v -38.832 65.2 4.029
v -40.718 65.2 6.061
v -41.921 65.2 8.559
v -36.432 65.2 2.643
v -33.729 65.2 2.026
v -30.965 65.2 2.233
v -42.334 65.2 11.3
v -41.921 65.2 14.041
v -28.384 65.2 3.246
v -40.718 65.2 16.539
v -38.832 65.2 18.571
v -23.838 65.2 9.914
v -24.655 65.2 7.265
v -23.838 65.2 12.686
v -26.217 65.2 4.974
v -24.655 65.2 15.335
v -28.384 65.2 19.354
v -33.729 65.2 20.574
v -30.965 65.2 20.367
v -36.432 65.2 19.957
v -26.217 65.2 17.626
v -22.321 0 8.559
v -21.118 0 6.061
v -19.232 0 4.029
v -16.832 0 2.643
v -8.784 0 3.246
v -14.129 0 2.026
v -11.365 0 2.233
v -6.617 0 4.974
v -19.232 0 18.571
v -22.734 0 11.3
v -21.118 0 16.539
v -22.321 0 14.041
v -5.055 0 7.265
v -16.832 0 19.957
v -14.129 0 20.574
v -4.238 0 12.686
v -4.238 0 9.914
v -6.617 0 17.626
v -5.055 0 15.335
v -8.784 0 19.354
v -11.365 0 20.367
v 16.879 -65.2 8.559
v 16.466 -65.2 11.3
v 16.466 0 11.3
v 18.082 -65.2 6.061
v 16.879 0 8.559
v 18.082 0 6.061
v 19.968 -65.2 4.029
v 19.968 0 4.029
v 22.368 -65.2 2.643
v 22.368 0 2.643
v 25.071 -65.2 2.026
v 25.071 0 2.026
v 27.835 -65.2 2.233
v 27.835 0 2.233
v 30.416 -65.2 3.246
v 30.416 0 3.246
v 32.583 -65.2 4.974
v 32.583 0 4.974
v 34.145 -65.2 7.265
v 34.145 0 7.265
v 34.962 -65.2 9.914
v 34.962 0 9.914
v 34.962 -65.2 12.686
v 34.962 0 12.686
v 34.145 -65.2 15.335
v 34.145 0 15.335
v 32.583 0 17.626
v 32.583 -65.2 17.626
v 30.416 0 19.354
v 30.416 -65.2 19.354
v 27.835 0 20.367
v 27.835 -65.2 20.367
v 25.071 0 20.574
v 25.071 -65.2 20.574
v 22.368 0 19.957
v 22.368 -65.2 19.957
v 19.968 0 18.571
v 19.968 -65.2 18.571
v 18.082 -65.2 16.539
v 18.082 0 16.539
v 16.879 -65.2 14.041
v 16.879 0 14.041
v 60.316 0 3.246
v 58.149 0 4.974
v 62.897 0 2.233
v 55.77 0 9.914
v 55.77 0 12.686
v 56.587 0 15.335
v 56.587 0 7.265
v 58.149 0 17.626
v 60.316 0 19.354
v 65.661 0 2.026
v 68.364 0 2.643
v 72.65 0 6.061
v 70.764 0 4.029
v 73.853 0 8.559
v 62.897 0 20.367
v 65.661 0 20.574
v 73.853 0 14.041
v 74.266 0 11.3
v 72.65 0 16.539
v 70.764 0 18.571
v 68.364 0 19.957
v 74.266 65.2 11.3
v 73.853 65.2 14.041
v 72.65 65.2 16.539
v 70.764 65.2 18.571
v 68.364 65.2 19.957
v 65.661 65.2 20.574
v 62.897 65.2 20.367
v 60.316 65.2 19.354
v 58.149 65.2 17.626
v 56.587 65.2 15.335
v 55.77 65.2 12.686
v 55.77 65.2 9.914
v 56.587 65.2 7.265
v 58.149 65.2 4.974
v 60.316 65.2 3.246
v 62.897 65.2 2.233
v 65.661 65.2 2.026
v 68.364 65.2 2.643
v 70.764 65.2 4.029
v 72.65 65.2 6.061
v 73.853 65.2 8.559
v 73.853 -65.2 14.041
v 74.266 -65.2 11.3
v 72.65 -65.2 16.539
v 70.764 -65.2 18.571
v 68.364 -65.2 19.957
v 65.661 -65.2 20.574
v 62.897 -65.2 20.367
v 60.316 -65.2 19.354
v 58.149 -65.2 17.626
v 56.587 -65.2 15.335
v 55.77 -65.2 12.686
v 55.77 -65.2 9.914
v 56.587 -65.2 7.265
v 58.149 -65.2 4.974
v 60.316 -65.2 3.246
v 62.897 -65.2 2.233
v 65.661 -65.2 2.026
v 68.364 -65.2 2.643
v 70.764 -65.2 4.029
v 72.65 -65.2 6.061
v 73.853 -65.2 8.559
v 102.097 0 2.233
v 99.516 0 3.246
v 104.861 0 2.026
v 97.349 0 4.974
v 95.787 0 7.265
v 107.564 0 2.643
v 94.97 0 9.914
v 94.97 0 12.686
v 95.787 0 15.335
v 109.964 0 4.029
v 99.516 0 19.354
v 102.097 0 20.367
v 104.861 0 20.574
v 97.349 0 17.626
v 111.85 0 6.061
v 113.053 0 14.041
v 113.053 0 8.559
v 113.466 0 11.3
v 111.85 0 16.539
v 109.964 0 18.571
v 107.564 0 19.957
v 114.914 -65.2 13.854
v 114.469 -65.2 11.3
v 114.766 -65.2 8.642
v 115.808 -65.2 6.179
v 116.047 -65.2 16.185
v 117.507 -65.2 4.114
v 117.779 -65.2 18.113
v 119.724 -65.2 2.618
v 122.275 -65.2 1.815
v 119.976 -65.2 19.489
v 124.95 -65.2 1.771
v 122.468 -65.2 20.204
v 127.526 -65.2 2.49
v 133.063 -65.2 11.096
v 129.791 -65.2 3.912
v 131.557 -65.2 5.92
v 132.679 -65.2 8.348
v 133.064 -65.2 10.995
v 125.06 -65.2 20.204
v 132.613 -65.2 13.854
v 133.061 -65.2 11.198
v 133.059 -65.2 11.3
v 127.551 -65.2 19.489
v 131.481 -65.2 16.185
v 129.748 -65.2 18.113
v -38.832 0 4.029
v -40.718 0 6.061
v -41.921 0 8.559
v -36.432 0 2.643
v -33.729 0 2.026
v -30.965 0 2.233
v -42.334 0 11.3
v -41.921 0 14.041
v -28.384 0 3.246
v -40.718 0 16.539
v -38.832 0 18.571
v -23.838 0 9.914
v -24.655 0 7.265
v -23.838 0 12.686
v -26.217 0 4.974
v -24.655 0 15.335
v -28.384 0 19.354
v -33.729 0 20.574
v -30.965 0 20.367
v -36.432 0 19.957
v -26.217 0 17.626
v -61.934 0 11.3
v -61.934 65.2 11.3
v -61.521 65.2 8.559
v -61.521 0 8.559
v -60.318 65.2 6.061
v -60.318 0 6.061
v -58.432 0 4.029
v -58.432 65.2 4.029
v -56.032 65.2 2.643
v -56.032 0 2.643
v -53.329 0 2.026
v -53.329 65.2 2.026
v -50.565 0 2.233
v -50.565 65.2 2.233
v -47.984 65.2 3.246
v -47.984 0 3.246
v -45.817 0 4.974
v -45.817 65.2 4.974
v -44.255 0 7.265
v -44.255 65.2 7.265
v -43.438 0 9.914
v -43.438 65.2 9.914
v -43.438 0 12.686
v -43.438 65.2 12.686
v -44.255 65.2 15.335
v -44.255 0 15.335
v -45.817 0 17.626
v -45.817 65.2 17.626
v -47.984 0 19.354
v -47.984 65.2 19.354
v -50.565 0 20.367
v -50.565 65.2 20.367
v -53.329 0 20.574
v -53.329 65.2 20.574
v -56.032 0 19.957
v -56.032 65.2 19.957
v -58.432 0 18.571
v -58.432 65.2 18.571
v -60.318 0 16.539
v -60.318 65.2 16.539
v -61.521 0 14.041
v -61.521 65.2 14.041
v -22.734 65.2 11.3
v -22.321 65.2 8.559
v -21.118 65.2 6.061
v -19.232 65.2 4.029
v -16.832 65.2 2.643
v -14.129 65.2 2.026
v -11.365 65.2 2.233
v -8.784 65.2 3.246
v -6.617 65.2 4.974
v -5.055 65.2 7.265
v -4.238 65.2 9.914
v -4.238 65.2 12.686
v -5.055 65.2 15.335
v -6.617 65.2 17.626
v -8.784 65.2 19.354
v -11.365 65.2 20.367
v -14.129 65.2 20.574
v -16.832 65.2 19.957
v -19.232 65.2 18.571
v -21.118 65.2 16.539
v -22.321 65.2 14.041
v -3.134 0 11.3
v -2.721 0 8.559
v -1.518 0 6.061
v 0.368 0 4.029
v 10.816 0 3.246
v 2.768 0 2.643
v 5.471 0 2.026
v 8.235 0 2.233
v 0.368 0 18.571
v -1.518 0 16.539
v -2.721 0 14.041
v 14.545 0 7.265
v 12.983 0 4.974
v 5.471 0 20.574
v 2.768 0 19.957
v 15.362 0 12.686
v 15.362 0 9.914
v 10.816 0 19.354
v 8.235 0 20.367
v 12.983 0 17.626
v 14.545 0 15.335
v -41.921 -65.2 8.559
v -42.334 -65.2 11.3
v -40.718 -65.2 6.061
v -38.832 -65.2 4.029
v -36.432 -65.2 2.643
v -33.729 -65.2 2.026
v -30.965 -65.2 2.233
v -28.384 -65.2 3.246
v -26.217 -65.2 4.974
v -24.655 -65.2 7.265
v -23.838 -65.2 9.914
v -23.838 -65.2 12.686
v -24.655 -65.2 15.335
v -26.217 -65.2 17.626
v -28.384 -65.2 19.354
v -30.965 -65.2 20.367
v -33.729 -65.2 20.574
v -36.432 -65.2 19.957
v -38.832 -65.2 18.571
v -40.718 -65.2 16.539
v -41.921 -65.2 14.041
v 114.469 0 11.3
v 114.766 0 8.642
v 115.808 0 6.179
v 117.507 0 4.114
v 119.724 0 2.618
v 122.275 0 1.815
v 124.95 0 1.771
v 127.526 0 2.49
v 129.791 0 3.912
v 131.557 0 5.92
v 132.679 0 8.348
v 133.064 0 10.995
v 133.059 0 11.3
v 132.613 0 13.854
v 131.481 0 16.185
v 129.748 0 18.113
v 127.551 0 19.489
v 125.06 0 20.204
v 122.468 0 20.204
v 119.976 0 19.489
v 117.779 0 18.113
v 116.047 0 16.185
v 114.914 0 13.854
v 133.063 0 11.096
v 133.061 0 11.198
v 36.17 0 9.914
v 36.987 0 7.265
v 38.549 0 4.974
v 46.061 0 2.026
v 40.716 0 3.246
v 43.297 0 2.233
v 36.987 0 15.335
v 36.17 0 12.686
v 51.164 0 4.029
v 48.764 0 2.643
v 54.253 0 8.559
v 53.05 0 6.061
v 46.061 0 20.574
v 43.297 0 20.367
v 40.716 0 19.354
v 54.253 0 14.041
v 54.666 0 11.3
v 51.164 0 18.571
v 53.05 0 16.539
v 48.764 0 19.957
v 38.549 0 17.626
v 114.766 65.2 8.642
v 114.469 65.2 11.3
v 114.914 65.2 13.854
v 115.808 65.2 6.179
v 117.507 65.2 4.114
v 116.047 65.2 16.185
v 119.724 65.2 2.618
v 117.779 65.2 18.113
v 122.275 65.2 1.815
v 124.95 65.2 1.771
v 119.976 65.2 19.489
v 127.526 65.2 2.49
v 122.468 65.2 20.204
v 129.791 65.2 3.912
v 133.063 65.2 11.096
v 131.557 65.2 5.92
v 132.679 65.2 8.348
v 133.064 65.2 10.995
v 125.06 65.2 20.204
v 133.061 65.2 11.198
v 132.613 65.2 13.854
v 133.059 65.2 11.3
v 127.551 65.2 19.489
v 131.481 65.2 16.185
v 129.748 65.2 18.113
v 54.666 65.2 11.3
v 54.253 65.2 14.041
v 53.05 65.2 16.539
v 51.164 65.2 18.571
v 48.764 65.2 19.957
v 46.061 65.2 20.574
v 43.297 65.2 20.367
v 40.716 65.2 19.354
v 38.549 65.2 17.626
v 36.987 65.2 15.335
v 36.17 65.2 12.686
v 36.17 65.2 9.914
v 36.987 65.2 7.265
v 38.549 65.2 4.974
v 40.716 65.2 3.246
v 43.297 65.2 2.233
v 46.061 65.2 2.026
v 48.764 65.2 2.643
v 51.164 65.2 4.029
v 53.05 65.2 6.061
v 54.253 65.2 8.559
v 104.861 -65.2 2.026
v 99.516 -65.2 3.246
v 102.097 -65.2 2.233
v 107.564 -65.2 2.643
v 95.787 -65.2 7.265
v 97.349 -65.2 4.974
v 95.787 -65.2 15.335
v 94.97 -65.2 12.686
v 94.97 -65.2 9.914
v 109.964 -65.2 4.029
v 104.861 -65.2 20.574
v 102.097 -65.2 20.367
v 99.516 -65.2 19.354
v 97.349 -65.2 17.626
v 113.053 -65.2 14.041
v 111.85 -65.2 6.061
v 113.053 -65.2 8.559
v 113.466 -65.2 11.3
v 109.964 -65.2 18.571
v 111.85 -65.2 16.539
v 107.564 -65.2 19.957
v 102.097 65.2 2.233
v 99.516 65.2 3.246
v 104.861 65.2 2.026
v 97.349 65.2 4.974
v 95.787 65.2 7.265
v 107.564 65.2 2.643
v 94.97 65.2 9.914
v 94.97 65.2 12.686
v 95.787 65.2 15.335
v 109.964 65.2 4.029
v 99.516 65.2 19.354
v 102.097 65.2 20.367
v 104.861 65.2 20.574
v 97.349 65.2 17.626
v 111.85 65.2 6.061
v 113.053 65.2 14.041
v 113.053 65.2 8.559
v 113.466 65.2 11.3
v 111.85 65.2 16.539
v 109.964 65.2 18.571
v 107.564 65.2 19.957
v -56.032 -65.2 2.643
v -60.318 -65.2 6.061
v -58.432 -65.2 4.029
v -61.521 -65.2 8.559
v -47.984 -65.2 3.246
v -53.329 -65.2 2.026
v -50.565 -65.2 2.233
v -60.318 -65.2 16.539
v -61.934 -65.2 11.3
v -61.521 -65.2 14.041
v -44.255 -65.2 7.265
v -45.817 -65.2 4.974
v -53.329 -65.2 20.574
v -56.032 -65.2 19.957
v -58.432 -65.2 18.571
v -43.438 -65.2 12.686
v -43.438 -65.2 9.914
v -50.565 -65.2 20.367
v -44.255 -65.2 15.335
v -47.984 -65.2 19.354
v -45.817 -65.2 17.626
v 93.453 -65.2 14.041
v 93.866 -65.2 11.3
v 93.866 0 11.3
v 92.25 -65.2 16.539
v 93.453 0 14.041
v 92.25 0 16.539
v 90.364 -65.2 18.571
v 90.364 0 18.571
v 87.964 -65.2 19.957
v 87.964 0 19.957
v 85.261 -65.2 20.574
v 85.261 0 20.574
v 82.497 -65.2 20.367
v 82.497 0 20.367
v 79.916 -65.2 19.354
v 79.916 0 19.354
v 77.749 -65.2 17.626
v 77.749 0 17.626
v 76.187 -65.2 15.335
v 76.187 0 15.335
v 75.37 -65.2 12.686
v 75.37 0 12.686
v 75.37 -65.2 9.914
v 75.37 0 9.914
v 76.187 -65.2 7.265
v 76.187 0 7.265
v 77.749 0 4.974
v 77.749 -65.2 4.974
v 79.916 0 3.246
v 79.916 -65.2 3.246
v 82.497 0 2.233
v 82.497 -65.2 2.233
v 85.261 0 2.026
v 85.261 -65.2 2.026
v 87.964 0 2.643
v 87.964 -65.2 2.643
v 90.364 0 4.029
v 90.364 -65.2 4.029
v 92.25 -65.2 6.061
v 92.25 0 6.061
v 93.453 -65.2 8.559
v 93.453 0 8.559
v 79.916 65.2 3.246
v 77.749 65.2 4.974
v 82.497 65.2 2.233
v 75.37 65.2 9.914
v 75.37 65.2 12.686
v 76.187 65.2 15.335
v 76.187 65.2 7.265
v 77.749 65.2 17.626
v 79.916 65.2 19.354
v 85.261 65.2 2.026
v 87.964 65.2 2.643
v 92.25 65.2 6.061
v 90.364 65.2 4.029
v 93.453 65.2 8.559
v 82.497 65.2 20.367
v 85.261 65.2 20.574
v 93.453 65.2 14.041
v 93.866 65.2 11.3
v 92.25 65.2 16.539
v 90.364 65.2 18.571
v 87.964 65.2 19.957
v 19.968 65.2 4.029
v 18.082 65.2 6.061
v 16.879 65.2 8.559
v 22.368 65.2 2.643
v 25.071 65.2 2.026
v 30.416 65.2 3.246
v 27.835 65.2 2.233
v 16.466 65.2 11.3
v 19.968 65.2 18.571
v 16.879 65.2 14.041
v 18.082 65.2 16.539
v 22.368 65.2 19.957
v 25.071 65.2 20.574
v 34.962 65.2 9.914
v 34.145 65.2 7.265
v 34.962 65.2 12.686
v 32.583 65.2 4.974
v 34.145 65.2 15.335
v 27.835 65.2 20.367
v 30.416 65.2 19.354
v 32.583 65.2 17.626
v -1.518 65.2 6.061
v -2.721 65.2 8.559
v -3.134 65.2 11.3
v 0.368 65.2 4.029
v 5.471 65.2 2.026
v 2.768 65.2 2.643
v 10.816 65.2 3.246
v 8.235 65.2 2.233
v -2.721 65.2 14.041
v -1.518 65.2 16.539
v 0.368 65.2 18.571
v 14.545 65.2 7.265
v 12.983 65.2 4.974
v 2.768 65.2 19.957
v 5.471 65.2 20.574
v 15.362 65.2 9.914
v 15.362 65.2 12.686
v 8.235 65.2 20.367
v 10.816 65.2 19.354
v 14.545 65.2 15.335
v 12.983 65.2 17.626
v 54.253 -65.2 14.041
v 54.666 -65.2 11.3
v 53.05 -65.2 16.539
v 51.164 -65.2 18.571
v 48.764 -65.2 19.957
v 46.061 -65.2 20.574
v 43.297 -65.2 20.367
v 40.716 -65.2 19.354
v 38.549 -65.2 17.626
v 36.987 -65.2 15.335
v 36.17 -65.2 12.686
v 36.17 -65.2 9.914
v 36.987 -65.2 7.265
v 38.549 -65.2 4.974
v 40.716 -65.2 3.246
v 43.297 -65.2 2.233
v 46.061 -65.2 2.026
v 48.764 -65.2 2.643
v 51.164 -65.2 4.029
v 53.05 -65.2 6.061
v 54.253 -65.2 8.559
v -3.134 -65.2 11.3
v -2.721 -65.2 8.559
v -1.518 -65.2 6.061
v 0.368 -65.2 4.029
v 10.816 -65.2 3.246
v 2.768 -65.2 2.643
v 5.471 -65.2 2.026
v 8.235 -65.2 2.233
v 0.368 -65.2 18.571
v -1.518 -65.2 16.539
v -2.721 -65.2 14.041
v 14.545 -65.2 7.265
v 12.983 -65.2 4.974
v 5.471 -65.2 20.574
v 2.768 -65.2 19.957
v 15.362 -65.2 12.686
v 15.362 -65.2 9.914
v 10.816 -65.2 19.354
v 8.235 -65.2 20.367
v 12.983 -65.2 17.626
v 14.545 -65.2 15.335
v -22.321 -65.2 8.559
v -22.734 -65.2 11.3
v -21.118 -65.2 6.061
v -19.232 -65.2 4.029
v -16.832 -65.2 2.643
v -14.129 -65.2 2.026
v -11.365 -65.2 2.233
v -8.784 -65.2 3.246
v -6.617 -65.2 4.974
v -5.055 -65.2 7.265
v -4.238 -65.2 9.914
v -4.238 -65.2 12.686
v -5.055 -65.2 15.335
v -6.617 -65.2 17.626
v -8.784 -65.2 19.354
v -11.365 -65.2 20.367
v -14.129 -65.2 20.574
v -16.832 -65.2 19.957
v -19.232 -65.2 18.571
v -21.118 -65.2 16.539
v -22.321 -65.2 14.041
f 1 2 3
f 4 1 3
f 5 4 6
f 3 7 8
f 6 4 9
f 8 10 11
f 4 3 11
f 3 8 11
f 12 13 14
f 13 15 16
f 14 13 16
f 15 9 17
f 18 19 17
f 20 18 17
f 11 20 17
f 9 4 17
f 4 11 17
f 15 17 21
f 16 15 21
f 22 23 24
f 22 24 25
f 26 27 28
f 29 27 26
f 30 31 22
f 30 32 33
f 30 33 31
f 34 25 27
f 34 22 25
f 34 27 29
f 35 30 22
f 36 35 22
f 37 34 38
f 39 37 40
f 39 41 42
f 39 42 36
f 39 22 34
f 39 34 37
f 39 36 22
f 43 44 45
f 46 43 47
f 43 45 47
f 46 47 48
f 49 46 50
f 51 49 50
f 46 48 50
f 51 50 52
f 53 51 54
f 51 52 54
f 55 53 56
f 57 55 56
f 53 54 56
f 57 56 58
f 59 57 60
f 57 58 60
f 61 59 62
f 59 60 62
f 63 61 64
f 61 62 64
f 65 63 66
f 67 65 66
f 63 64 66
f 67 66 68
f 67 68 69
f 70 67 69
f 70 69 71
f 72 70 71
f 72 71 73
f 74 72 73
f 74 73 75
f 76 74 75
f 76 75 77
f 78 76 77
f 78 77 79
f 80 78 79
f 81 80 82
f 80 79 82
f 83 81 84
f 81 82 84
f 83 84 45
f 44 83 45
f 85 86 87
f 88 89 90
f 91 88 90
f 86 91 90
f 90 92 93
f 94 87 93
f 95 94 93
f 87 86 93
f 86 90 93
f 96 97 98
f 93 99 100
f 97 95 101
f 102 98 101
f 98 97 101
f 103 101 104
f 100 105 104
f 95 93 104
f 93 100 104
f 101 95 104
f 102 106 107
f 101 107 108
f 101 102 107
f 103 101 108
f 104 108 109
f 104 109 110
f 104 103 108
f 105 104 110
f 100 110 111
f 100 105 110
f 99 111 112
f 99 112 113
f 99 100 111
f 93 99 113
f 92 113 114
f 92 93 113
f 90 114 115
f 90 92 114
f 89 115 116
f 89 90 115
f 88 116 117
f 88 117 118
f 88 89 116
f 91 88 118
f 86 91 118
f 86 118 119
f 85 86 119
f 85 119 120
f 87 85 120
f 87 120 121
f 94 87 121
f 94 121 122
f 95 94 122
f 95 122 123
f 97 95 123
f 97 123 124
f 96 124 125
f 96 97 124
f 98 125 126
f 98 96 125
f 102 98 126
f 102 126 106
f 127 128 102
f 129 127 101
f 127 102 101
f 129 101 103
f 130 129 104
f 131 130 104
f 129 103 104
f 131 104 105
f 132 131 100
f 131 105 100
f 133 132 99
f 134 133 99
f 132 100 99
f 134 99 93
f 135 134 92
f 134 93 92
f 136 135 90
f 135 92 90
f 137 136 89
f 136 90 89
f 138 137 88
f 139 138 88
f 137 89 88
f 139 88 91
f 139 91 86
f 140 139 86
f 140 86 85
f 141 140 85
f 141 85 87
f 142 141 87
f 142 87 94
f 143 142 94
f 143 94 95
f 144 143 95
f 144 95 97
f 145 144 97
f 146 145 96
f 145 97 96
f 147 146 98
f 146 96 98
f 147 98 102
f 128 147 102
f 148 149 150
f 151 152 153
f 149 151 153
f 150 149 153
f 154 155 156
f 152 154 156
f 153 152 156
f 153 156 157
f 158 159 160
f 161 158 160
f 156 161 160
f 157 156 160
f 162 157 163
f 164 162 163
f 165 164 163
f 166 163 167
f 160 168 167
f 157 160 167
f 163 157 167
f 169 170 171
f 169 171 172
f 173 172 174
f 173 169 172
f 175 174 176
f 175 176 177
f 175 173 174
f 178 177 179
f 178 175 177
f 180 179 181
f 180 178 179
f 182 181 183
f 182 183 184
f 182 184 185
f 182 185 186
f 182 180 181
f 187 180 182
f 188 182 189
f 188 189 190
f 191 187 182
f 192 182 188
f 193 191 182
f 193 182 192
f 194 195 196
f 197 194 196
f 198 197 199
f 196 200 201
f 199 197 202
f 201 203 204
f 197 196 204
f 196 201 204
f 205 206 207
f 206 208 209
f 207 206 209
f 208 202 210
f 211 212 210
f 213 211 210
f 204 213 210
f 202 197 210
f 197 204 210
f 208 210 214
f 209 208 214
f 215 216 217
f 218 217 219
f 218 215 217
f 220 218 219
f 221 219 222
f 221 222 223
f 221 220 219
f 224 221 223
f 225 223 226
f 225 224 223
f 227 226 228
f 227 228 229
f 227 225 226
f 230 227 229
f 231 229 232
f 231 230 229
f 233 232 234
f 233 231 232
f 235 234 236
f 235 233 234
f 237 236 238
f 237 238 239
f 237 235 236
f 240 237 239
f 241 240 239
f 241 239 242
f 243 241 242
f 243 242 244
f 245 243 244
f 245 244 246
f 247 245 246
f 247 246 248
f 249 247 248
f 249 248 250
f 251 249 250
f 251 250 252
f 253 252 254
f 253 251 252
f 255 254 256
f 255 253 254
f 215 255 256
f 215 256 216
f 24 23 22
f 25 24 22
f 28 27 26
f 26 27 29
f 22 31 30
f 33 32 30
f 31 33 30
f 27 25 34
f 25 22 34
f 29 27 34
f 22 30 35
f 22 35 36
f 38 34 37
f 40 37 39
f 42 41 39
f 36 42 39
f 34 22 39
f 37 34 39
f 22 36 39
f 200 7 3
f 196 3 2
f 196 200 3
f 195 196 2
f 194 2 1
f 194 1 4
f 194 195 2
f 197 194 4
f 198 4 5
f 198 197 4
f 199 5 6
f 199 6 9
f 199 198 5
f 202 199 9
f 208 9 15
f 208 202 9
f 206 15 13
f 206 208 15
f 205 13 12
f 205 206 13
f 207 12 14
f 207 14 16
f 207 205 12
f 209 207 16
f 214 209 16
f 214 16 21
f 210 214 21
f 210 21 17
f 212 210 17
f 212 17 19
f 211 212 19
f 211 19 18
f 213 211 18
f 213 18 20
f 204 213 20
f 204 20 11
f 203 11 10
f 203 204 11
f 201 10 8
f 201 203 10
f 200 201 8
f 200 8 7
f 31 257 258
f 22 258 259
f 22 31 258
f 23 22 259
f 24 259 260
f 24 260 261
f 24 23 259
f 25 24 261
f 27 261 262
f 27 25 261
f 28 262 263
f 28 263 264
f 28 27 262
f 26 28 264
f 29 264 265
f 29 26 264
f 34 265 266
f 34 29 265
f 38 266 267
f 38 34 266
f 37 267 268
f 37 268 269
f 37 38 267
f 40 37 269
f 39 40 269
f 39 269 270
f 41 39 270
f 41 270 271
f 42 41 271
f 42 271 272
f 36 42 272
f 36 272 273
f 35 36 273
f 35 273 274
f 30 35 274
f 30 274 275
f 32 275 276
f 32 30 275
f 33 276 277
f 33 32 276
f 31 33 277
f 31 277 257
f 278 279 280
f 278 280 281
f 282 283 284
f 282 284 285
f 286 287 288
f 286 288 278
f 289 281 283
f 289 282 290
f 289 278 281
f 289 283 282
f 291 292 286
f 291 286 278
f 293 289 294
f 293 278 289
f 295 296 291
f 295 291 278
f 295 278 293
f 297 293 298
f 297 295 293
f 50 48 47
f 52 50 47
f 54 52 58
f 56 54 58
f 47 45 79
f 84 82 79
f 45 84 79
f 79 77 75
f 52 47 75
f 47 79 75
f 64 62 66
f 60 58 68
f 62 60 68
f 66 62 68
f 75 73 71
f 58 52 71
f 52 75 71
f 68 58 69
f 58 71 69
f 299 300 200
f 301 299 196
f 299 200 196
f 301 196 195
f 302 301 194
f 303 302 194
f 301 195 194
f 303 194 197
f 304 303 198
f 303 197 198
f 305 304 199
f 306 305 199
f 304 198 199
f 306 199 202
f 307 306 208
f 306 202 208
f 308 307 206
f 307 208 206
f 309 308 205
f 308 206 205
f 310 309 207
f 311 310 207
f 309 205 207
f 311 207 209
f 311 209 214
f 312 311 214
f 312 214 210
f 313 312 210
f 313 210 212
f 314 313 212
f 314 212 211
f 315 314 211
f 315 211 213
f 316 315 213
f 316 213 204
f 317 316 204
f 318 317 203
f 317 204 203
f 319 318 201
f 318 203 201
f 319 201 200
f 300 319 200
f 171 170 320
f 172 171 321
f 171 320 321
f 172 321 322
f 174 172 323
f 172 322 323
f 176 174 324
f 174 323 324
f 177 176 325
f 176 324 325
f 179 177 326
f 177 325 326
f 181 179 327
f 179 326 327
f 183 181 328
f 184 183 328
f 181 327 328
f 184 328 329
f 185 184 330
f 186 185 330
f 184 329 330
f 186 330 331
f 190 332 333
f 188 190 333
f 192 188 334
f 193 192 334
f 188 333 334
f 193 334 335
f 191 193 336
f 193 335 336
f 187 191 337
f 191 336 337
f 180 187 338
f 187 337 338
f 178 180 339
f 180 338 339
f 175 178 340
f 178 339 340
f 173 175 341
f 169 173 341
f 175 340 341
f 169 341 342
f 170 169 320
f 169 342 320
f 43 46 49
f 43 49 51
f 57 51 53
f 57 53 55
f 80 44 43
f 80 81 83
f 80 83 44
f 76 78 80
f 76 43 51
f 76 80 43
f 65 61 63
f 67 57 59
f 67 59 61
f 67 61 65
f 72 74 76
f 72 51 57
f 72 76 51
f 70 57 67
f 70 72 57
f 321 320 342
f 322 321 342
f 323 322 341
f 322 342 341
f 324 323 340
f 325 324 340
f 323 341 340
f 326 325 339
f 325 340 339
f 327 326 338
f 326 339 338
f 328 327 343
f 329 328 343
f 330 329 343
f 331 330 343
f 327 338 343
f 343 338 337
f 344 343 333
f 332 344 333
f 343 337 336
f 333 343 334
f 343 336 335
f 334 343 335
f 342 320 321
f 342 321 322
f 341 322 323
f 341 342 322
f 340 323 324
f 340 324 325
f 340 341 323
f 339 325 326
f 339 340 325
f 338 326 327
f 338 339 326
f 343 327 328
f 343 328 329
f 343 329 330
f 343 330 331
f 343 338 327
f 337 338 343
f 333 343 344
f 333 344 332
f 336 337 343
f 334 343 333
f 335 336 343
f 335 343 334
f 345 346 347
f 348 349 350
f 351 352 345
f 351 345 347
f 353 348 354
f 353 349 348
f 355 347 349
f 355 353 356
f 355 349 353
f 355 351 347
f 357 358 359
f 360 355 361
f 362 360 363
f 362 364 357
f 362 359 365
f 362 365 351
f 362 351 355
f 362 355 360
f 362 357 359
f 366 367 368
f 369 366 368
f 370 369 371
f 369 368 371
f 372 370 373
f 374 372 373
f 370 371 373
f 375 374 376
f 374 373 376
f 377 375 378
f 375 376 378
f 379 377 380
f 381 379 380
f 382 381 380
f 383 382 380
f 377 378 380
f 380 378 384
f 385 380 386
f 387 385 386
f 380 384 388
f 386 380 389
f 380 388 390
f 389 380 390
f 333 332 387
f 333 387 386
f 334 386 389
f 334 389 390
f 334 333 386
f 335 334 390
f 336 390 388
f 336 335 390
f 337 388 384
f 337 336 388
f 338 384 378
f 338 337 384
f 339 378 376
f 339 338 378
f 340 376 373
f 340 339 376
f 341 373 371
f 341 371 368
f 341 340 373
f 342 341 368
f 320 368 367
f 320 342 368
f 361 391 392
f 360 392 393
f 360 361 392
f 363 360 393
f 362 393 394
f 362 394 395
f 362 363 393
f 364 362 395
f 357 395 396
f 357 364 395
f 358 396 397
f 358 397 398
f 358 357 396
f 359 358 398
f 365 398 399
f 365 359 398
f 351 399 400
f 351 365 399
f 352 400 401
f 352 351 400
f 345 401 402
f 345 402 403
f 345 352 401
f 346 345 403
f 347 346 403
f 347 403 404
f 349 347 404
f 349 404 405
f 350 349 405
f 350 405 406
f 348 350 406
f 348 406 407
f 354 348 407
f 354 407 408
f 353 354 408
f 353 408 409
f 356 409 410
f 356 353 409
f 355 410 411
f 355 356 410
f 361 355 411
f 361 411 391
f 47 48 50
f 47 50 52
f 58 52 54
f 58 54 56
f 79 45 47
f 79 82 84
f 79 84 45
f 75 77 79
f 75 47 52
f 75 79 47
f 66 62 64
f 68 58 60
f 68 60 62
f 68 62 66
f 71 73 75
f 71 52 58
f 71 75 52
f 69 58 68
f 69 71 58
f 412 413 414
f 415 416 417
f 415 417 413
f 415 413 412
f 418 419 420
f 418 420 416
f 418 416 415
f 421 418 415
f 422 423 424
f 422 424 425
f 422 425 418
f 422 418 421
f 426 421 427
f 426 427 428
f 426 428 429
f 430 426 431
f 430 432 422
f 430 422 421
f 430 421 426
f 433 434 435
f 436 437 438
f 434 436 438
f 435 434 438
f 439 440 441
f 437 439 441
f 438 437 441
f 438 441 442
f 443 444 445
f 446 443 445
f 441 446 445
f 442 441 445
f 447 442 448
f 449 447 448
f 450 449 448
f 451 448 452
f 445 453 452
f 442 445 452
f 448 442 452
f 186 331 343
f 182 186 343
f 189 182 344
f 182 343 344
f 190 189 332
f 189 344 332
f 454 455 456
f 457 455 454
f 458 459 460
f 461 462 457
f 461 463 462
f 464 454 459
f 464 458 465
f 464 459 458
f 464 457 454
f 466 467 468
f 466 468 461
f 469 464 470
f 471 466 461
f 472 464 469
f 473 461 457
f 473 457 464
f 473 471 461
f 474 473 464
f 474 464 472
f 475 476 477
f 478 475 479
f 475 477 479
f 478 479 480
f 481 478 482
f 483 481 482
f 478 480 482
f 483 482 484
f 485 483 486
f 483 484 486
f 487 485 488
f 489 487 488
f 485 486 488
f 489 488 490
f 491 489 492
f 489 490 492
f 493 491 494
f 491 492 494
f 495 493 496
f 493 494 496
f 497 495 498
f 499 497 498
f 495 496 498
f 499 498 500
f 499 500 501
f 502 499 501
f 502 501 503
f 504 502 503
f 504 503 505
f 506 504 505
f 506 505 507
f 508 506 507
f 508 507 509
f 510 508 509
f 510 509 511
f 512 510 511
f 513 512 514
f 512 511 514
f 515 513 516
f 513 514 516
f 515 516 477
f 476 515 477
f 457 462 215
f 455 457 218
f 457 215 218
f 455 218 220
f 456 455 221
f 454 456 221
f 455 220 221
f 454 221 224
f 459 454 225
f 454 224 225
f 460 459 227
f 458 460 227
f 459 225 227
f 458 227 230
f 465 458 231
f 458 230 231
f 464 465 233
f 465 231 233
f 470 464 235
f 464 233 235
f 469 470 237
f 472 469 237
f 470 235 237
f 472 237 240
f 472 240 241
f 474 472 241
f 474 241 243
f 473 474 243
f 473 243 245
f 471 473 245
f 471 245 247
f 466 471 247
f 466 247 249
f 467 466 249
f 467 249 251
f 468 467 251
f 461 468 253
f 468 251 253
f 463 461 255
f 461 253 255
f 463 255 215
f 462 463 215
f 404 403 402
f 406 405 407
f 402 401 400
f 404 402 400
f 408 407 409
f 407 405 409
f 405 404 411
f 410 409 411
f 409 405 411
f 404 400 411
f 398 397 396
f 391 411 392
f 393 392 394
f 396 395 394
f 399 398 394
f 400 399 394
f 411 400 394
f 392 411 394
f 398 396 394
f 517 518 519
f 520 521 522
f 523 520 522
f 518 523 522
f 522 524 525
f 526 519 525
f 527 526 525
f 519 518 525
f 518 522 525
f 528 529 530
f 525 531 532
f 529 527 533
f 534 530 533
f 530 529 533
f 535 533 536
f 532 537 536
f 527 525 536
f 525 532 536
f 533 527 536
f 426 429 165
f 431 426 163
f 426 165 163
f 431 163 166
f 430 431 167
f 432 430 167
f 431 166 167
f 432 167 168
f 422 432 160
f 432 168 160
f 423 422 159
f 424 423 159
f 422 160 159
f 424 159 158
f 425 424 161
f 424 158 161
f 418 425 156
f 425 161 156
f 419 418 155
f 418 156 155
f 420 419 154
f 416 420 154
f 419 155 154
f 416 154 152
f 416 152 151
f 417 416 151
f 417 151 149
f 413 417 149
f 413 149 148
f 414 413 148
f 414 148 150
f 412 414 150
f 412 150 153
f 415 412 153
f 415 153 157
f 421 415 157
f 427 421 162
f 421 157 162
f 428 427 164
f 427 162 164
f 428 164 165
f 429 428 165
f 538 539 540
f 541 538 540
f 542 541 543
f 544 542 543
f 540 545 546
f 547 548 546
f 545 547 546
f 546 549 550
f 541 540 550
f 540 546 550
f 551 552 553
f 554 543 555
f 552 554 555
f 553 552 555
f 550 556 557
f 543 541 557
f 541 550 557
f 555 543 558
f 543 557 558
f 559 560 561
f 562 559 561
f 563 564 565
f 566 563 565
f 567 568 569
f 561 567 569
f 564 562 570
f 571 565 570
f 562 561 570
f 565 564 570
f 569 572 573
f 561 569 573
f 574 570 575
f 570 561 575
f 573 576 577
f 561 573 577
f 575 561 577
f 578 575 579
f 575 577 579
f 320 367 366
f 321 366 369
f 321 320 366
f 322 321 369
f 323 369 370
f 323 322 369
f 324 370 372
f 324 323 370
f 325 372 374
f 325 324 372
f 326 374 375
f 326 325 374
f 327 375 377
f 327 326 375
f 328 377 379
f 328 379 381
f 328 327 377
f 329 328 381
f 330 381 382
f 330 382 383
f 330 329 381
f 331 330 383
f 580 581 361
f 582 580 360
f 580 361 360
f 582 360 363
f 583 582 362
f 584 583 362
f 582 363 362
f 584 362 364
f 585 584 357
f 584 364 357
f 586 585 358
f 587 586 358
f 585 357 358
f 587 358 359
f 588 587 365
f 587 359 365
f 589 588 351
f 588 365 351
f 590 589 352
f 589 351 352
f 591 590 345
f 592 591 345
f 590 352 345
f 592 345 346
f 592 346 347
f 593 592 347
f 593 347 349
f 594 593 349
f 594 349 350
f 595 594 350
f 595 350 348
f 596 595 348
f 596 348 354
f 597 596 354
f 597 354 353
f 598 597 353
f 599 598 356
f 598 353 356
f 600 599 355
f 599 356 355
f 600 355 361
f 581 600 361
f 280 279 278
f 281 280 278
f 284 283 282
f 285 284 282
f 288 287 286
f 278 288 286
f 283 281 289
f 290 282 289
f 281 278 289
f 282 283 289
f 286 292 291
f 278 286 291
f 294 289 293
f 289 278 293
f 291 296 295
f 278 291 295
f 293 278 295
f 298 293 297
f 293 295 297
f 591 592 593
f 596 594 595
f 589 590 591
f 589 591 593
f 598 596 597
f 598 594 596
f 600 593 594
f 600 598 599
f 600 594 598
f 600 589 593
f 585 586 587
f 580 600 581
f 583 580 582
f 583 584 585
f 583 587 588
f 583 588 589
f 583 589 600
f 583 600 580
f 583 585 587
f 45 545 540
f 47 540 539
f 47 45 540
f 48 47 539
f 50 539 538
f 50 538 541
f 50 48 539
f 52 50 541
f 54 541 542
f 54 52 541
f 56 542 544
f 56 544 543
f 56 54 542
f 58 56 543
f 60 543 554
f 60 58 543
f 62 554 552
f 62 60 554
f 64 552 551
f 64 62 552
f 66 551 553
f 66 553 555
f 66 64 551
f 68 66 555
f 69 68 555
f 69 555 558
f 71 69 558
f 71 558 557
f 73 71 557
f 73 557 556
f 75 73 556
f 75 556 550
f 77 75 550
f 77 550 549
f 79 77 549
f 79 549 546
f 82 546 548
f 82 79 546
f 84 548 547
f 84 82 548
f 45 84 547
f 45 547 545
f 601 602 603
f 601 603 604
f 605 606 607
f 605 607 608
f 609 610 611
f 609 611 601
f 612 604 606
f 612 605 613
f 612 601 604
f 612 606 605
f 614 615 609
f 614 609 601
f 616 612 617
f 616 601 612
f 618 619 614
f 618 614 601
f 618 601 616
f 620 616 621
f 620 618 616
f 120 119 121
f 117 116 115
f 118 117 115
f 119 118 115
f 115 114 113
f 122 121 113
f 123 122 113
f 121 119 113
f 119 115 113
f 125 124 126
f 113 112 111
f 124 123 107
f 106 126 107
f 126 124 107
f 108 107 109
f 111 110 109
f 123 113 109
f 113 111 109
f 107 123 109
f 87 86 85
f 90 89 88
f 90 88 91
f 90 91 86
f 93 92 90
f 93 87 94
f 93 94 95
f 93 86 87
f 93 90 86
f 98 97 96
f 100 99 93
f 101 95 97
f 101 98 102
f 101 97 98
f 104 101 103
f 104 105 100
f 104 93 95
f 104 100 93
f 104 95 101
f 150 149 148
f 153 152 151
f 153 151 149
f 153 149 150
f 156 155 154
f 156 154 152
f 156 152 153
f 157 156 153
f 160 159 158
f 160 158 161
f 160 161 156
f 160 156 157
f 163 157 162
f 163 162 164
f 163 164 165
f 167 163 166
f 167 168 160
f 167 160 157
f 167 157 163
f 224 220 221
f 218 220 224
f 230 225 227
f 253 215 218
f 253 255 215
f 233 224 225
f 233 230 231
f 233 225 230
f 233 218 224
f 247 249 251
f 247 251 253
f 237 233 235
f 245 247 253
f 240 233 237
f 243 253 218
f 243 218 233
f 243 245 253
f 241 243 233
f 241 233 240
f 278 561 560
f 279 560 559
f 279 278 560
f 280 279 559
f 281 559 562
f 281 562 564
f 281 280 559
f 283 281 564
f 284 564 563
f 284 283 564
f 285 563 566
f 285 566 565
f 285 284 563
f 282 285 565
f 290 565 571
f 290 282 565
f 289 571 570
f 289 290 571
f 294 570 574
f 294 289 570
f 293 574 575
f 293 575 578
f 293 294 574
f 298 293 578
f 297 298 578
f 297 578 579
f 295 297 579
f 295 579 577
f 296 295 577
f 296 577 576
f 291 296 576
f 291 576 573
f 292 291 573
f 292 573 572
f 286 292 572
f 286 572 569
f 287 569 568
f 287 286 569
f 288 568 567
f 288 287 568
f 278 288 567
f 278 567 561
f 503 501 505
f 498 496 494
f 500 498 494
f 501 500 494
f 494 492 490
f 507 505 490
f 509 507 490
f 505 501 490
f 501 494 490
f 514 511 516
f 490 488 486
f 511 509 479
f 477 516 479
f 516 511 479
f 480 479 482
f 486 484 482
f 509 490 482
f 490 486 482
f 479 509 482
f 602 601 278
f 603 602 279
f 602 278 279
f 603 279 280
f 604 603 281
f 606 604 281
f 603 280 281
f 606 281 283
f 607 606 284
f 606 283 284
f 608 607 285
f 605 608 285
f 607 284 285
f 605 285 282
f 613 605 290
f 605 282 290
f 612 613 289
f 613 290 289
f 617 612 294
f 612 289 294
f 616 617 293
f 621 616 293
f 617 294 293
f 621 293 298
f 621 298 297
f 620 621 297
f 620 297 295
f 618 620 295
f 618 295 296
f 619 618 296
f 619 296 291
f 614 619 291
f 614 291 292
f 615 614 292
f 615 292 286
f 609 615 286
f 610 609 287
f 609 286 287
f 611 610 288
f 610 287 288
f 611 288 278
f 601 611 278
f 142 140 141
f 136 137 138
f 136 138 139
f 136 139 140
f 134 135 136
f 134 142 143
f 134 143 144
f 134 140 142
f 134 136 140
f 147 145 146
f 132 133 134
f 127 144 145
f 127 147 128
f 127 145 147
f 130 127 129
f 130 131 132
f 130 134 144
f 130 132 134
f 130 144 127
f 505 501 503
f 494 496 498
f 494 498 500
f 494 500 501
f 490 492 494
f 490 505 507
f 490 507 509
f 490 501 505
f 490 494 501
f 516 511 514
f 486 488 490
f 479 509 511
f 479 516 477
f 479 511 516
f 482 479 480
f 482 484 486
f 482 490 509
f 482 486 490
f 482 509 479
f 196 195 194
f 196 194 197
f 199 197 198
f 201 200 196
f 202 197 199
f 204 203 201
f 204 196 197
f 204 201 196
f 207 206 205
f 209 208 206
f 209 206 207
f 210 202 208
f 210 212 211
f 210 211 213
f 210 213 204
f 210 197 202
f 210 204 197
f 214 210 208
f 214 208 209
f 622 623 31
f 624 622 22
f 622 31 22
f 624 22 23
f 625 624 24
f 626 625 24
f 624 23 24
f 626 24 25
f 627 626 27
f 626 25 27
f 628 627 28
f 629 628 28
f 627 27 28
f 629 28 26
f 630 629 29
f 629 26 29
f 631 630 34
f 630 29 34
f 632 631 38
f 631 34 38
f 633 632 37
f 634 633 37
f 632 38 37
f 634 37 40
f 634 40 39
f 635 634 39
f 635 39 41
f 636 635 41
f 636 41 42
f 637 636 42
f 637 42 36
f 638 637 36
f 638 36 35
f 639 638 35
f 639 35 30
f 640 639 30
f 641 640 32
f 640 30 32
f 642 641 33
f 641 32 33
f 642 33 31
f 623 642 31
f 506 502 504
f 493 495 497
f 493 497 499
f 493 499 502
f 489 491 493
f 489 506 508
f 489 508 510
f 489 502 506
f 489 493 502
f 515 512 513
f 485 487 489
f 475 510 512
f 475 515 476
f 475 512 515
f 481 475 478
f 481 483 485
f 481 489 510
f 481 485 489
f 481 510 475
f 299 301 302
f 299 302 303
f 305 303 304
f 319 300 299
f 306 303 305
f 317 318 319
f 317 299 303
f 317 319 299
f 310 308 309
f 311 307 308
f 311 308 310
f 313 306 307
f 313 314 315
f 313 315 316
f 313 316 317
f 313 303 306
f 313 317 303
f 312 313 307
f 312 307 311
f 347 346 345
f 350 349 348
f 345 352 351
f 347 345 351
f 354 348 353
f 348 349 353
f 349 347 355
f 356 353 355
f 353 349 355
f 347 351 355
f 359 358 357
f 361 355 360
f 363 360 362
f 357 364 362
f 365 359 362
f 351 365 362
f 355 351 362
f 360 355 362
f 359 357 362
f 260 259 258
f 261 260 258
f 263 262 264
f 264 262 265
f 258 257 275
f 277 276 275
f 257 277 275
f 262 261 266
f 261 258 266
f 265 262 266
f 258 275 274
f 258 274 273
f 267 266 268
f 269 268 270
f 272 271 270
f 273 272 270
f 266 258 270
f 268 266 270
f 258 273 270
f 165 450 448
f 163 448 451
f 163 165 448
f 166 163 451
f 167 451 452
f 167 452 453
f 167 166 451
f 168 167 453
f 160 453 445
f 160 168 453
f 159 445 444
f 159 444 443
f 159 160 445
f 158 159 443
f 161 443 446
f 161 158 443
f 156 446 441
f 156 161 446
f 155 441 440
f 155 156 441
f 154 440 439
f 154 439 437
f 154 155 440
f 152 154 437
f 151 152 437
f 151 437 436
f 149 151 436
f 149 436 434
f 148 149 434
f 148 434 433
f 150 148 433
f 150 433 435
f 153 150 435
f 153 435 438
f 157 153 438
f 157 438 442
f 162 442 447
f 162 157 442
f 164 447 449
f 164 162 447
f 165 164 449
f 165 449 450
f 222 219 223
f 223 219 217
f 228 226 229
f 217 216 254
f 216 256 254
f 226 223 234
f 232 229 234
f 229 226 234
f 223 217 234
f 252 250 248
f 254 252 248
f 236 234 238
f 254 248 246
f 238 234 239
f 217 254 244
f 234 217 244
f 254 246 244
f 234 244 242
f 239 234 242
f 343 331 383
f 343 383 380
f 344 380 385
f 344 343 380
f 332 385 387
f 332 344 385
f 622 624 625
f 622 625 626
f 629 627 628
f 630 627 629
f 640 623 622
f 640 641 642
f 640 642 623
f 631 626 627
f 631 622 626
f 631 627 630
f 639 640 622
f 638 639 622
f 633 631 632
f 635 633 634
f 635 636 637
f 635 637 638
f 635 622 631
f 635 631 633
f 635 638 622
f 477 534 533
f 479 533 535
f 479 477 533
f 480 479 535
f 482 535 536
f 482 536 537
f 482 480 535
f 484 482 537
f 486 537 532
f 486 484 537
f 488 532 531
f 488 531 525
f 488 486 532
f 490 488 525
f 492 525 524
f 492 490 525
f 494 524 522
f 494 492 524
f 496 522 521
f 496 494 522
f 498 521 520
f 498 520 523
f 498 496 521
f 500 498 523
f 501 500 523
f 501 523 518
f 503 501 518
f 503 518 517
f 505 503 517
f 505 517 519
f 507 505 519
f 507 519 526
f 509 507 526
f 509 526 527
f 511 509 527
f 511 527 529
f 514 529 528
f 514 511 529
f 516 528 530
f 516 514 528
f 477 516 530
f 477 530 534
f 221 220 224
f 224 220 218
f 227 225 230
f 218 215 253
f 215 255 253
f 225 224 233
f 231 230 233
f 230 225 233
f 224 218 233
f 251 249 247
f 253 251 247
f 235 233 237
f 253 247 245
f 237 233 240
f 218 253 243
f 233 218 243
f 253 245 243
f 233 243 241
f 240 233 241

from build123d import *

# Parameters (mm, degrees)
F1_DEPTH = 65.2


with BuildPart() as f1:
    # F0 (on Front) → F1 (new body)
    with BuildSketch(Plane.XZ):
        with BuildLine():
            Line((-61.9339610934, 11.3), (-43.3339610934, 11.3))
            ThreePointArc((-43.3339610934, 11.3), (-52.6339610934, 20.6), (-61.9339610934, 11.3))
        make_face()
        with BuildLine():
            ThreePointArc((-61.9339610934, 11.3), (-52.6339610934, 2), (-43.3339610934, 11.3))
            Line((-43.3339610934, 11.3), (-61.9339610934, 11.3))
        make_face()
    extrude(amount=F1_DEPTH)


with BuildPart() as f1b:
    # F0 (on Front) → F1, piece 2 (new body)
    with BuildSketch(Plane.XZ):
        with BuildLine():
            ThreePointArc((-23.7339610934, 11.3), (-33.0339610934, 20.6), (-42.3339610934, 11.3))
            Line((-42.3339610934, 11.3), (-23.7339610934, 11.3))
        make_face()
        with BuildLine():
            Line((-23.7339610934, 11.3), (-42.3339610934, 11.3))
            ThreePointArc((-42.3339610934, 11.3), (-33.0339610934, 2), (-23.7339610934, 11.3))
        make_face()
    extrude(amount=F1_DEPTH)


with BuildPart() as f1c:
    # F0 (on Front) → F1, piece 3 (new body)
    with BuildSketch(Plane.XZ):
        with BuildLine():
            ThreePointArc((-4.1339610934, 11.3), (-13.4339610934, 20.6), (-22.7339610934, 11.3))
            Line((-22.7339610934, 11.3), (-4.1339610934, 11.3))
        make_face()
        with BuildLine():
            Line((-4.1339610934, 11.3), (-22.7339610934, 11.3))
            ThreePointArc((-22.7339610934, 11.3), (-13.4339610934, 2), (-4.1339610934, 11.3))
        make_face()
    extrude(amount=F1_DEPTH)


with BuildPart() as f1d:
    # F0 (on Front) → F1, piece 4 (new body)
    with BuildSketch(Plane.XZ):
        with BuildLine():
            ThreePointArc((15.4660389066, 11.3), (6.1660389066, 20.6), (-3.1339610934, 11.3))
            Line((-3.1339610934, 11.3), (15.4660389066, 11.3))
        make_face()
        with BuildLine():
            Line((15.4660389066, 11.3), (-3.1339610934, 11.3))
            ThreePointArc((-3.1339610934, 11.3), (6.1660389066, 2), (15.4660389066, 11.3))
        make_face()
    extrude(amount=F1_DEPTH)


with BuildPart() as f1e:
    # F0 (on Front) → F1, piece 5 (new body)
    with BuildSketch(Plane.XZ):
        with BuildLine():
            ThreePointArc((35.0660389066, 11.3), (25.7660389066, 20.6), (16.4660389066, 11.3))
            Line((16.4660389066, 11.3), (35.0660389066, 11.3))
        make_face()
        with BuildLine():
            Line((35.0660389066, 11.3), (16.4660389066, 11.3))
            ThreePointArc((16.4660389066, 11.3), (25.7660389066, 2), (35.0660389066, 11.3))
        make_face()
    extrude(amount=F1_DEPTH)


with BuildPart() as f1f:
    # F0 (on Front) → F1, piece 6 (new body)
    with BuildSketch(Plane.XZ):
        with BuildLine():
            Line((54.6660389066, 11.3), (36.0660389066, 11.3))
            ThreePointArc((36.0660389066, 11.3), (45.3660389066, 2), (54.6660389066, 11.3))
        make_face()
        with BuildLine():
            ThreePointArc((54.6660389066, 11.3), (45.3660389066, 20.6), (36.0660389066, 11.3))
            Line((36.0660389066, 11.3), (54.6660389066, 11.3))
        make_face()
    extrude(amount=F1_DEPTH)


with BuildPart() as f1g:
    # F0 (on Front) → F1, piece 7 (new body)
    with BuildSketch(Plane.XZ):
        with BuildLine():
            Line((74.2660389066, 11.3), (55.6660389066, 11.3))
            ThreePointArc((55.6660389066, 11.3), (64.9660389066, 2), (74.2660389066, 11.3))
        make_face()
        with BuildLine():
            ThreePointArc((74.2660389066, 11.3), (64.9660389066, 20.6), (55.6660389066, 11.3))
            Line((55.6660389066, 11.3), (74.2660389066, 11.3))
        make_face()
    extrude(amount=F1_DEPTH)


with BuildPart() as f1h:
    # F0 (on Front) → F1, piece 8 (new body)
    with BuildSketch(Plane.XZ):
        with BuildLine():
            ThreePointArc((75.2660389066, 11.3), (84.5660389066, 2), (93.8660389066, 11.3))
            Line((93.8660389066, 11.3), (75.2660389066, 11.3))
        make_face()
        with BuildLine():
            Line((75.2660389066, 11.3), (93.8660389066, 11.3))
            ThreePointArc((93.8660389066, 11.3), (84.5660389066, 20.6), (75.2660389066, 11.3))
        make_face()
    extrude(amount=F1_DEPTH)


with BuildPart() as f1i:
    # F0 (on Front) → F1, piece 9 (new body)
    with BuildSketch(Plane.XZ):
        with BuildLine():
            ThreePointArc((94.8660389066, 11.3), (104.1660389066, 2), (113.4660389066, 11.3))
            Line((113.4660389066, 11.3), (94.8660389066, 11.3))
        make_face()
        with BuildLine():
            Line((94.8660389066, 11.3), (113.4660389066, 11.3))
            ThreePointArc((113.4660389066, 11.3), (104.1660389066, 20.6), (94.8660389066, 11.3))
        make_face()
    extrude(amount=F1_DEPTH)


with BuildPart() as f1j:
    # F0 (on Front) → F1, piece 10 (new body)
    with BuildSketch(Plane.XZ):
        with BuildLine():
            ThreePointArc((133.0636610872, 10.9947052806), (133.0624079115, 11.1473732123), (133.0586487222, 11.3))
            Line((133.0586487222, 11.3), (114.4686734522, 11.3))
            ThreePointArc((114.4686734522, 11.3), (123.6109931555, 1.6959584563), (133.0636610872, 10.9947052806))
        make_face()
        with BuildLine():
            Line((114.4686734522, 11.3), (133.0586487222, 11.3))
            ThreePointArc((133.0586487222, 11.3), (123.7636610872, 20.2947052806), (114.4686734522, 11.3))
        make_face()
    extrude(amount=F1_DEPTH)


with BuildPart() as f2_1:
    # F2: instance of F1
    add(f1.part.mirror(Plane.XZ))


with BuildPart() as f2_2:
    # F2: instance of F1b
    add(f1b.part.mirror(Plane.XZ))


with BuildPart() as f2_3:
    # F2: instance of F1c
    add(f1c.part.mirror(Plane.XZ))


with BuildPart() as f2_4:
    # F2: instance of F1d
    add(f1d.part.mirror(Plane.XZ))


with BuildPart() as f2_5:
    # F2: instance of F1e
    add(f1e.part.mirror(Plane.XZ))


with BuildPart() as f2_6:
    # F2: instance of F1f
    add(f1f.part.mirror(Plane.XZ))


with BuildPart() as f2_7:
    # F2: instance of F1g
    add(f1g.part.mirror(Plane.XZ))


with BuildPart() as f2_8:
    # F2: instance of F1h
    add(f1h.part.mirror(Plane.XZ))


with BuildPart() as f2_9:
    # F2: instance of F1i
    add(f1i.part.mirror(Plane.XZ))


with BuildPart() as f2_10:
    # F2: instance of F1j
    add(f1j.part.mirror(Plane.XZ))


solid = Compound([f1.part, f1b.part, f1c.part, f1d.part, f1e.part, f1f.part, f1g.part, f1h.part, f1i.part, f1j.part, f2_1.part, f2_2.part, f2_3.part, f2_4.part, f2_5.part, f2_6.part, f2_7.part, f2_8.part, f2_9.part, f2_10.part])
